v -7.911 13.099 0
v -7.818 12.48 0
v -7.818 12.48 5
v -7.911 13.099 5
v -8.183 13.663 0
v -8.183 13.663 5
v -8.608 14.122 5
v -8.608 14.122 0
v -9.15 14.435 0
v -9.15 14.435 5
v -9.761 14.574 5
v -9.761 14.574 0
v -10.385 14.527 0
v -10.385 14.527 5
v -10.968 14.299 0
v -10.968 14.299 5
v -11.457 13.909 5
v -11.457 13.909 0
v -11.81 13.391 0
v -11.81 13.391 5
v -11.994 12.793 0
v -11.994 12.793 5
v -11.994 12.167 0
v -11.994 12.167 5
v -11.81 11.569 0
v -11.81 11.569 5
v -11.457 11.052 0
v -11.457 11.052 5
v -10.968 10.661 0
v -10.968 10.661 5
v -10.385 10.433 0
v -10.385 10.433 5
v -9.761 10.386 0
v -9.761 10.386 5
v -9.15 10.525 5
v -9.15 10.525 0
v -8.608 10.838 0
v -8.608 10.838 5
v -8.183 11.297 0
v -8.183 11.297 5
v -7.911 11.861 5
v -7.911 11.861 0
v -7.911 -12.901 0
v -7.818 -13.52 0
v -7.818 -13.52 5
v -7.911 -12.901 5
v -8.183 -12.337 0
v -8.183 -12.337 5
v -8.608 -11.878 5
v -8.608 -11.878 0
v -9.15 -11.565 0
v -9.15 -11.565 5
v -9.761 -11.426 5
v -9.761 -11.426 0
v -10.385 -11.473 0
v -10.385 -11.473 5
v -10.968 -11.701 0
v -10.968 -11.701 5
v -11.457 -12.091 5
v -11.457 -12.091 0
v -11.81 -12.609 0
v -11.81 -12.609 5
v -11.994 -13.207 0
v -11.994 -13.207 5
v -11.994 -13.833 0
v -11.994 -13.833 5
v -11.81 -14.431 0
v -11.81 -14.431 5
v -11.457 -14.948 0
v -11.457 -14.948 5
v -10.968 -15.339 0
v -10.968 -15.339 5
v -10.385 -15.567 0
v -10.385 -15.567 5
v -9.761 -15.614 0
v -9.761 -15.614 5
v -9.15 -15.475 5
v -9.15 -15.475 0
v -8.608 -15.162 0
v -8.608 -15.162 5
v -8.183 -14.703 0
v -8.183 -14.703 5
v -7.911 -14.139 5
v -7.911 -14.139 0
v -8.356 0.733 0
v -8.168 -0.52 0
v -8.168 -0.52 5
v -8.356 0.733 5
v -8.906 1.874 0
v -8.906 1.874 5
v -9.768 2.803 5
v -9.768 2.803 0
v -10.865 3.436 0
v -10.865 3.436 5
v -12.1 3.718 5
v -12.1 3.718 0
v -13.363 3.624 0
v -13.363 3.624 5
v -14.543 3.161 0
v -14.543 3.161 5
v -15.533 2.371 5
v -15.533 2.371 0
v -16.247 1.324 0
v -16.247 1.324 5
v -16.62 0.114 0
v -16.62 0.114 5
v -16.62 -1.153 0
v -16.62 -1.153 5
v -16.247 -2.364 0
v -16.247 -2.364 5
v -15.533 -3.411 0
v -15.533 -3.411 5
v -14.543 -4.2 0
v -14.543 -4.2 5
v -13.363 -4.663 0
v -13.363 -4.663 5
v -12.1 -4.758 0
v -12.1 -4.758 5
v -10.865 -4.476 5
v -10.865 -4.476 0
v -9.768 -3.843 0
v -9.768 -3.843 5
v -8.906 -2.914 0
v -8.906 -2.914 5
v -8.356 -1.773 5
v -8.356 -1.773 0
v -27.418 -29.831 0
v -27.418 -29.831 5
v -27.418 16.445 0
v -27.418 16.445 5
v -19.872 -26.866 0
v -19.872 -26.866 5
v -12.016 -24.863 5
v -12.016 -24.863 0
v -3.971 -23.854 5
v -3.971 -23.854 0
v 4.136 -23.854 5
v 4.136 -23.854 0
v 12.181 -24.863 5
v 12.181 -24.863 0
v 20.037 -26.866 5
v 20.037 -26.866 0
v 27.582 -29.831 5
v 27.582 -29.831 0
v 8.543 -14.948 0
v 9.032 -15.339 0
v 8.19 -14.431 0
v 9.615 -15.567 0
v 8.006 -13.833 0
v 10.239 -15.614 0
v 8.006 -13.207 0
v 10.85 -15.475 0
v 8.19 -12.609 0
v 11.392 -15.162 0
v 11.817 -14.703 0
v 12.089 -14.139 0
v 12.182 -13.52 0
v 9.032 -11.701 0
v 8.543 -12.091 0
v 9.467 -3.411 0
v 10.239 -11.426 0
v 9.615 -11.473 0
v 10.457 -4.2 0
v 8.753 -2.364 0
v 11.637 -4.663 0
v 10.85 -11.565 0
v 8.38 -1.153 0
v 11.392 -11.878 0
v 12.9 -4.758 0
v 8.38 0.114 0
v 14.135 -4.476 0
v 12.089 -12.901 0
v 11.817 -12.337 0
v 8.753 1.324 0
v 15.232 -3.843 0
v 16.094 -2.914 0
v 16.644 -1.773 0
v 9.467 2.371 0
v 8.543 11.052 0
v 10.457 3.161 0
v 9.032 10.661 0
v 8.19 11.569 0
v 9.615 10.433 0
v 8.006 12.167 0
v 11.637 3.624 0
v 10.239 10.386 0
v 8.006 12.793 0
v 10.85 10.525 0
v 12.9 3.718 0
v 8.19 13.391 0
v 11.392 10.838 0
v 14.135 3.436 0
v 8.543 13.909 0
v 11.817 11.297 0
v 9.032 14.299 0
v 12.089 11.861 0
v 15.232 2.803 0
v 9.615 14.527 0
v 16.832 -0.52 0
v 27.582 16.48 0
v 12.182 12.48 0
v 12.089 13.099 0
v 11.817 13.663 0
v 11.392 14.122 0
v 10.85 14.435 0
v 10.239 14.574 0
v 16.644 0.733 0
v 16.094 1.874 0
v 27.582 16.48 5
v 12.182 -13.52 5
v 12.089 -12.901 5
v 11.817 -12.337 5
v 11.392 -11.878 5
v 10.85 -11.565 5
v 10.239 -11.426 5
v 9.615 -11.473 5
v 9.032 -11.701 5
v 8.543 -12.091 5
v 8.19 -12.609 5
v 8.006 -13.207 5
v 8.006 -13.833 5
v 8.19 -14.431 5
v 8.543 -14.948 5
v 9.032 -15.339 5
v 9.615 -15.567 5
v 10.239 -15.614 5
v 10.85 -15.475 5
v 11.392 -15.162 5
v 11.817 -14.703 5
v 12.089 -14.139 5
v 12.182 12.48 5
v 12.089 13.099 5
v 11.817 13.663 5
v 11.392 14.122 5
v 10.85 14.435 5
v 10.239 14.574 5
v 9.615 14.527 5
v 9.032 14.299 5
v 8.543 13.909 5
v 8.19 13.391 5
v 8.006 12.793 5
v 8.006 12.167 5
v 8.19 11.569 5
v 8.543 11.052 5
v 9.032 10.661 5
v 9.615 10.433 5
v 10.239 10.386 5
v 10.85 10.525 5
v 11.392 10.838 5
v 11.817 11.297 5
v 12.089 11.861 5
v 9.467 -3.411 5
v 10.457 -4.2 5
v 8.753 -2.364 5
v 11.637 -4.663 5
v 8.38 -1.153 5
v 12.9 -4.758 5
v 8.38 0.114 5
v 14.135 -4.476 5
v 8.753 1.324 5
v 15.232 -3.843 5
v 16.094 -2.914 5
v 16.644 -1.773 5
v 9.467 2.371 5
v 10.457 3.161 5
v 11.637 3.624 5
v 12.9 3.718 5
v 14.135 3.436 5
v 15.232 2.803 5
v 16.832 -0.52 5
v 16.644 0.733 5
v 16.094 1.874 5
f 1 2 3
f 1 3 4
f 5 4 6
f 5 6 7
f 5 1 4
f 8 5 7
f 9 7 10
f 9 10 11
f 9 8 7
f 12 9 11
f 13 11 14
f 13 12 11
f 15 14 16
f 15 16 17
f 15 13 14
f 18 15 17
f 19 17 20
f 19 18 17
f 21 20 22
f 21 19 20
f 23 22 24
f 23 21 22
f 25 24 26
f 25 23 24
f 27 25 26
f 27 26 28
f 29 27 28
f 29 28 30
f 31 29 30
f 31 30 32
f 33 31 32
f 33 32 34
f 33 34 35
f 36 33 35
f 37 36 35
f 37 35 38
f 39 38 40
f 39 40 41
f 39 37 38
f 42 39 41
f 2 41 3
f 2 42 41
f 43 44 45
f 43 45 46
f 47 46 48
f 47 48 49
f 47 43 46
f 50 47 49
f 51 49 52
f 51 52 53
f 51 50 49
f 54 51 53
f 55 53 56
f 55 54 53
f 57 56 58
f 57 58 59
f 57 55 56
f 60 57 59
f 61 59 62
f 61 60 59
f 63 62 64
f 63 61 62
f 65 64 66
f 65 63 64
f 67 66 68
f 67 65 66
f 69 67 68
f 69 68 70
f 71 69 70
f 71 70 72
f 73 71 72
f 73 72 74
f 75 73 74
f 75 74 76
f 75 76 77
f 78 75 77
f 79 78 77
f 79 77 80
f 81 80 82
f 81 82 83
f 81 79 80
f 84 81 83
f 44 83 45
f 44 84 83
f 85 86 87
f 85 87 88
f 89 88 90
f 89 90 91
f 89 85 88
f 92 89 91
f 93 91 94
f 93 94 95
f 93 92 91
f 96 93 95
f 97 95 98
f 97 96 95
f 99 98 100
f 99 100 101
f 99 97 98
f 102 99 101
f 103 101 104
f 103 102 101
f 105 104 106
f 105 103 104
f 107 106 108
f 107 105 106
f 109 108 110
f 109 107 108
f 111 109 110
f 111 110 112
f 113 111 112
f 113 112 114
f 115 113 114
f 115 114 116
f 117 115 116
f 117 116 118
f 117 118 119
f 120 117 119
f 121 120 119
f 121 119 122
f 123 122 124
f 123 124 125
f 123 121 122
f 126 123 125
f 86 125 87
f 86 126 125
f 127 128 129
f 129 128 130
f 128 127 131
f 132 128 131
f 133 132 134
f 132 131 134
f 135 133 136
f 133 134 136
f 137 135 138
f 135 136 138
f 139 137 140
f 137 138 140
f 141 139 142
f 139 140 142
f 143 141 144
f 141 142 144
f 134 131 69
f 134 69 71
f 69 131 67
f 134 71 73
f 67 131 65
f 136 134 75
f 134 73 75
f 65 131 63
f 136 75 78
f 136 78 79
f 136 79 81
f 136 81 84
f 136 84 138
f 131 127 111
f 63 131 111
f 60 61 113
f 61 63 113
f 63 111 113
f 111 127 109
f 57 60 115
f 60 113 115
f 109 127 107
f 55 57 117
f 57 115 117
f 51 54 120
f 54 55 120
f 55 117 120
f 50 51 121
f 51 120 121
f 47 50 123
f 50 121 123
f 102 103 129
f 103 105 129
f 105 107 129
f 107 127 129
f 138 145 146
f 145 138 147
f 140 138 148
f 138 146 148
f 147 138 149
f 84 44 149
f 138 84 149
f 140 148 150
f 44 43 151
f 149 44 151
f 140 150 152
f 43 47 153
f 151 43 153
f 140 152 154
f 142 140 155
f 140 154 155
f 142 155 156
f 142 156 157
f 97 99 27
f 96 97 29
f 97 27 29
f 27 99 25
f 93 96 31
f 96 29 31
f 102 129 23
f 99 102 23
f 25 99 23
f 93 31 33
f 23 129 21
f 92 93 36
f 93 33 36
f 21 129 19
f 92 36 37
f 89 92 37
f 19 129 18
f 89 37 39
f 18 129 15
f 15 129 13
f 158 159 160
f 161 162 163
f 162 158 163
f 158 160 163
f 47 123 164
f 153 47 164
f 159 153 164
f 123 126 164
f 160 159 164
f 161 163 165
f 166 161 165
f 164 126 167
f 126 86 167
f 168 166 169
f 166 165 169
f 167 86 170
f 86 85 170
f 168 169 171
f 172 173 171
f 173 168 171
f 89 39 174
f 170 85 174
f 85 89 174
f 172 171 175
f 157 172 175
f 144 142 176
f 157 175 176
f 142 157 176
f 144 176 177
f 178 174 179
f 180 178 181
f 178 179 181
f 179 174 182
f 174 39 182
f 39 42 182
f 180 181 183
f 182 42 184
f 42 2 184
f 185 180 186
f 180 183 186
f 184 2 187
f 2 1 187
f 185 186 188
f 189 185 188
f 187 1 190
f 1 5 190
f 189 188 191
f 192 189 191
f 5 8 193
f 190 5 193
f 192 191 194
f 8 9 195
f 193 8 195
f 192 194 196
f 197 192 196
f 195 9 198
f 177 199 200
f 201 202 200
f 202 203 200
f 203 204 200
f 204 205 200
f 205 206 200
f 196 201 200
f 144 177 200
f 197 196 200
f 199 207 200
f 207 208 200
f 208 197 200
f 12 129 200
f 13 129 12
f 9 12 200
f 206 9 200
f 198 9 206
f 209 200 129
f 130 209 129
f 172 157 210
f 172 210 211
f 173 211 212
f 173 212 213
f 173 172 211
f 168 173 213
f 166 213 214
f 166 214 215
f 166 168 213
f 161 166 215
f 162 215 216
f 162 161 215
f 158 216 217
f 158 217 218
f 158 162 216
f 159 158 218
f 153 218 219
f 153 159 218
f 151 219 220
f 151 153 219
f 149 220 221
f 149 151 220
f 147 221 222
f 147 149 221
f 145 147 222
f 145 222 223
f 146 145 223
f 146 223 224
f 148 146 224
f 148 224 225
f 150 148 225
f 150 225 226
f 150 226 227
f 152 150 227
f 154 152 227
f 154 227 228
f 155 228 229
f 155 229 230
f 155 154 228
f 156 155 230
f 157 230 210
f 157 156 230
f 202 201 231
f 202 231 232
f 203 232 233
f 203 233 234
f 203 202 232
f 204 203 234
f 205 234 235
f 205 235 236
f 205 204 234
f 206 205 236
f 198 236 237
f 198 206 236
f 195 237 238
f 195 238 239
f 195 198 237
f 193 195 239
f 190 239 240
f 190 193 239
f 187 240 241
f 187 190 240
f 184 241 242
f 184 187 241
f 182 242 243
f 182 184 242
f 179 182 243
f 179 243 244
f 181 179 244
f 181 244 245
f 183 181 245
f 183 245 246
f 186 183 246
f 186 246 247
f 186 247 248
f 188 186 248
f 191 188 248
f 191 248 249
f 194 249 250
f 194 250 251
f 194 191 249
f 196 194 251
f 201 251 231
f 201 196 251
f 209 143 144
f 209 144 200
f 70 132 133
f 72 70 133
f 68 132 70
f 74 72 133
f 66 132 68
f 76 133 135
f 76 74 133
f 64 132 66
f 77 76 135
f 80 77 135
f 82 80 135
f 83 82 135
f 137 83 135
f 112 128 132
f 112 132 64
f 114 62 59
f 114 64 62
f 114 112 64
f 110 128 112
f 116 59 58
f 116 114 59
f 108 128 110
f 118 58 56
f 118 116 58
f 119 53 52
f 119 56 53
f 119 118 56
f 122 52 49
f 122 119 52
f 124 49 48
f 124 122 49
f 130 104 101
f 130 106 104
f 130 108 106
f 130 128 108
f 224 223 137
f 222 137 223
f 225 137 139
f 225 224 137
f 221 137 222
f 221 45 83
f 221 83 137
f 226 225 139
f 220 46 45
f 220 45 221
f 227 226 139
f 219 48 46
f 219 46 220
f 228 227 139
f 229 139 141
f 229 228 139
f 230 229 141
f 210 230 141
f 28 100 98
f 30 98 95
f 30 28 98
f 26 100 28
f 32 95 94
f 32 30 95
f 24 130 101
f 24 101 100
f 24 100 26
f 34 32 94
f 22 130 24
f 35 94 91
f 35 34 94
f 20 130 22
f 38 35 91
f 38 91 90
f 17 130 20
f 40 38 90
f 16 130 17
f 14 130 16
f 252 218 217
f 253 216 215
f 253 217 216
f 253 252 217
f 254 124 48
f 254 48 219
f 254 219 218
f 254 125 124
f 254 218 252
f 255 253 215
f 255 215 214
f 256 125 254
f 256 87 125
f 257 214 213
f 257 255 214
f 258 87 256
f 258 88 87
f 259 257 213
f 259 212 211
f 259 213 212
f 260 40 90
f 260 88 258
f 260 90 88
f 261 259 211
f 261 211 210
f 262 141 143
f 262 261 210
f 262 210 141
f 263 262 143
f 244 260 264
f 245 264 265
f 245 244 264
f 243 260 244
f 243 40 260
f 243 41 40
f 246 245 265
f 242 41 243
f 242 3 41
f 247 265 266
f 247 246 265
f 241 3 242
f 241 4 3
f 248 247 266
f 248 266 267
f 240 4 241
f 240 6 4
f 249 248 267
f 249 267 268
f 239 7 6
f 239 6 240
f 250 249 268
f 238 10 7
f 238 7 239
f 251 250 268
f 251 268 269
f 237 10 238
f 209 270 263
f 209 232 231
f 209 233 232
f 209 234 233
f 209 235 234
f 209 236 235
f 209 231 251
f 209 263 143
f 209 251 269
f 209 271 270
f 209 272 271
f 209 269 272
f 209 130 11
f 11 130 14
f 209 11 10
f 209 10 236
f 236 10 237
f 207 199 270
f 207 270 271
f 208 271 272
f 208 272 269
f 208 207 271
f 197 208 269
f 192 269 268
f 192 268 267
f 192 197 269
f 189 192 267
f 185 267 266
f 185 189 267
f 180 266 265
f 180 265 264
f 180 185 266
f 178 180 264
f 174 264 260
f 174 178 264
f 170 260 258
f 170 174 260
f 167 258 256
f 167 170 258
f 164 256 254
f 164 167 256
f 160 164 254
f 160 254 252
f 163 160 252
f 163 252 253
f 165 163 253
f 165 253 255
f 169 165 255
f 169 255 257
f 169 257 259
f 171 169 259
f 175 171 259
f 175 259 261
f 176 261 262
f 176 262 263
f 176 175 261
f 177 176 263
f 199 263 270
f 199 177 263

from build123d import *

# Parameters (mm, degrees)
SKETCH1_R           = 4.25
SKETCH1_R_2         = 2.1
BOSS_EXTRUDE1_DEPTH = 5
SKETCH2_W           = 23
SKETCH2_H           = 60
CUT_EXTRUDE1_DEPTH  = 10
FILLET1_R           = 5
FILLET2_R           = 5
CUT_EXTRUDE2_DEPTH  = 5


with BuildPart() as part:
    # Sketch1 → Boss-Extrude1 (new body)
    with BuildSketch(Plane.XY):
        with BuildLine():
            Line((-50.417601538, -29.831415105), (-27.417601538, -29.831415105))
            ThreePointArc((-27.417601538, -29.831415105), (0.082398462, -23.727510052), (27.582398462, -29.831415105))
            Line((27.582398462, -29.831415105), (50.582398462, -29.831415105))
            Line((50.582398462, -29.831415105), (50.582398462, 25.168584895))
            ThreePointArc((50.582398462, 25.168584895), (49.117932367, 28.704118801), (45.582398462, 30.168584895))
            Line((45.582398462, 30.168584895), (-45.417601538, 30.168584895))
            ThreePointArc((-45.417601538, 30.168584895), (-48.953135444, 28.704118801), (-50.417601538, 25.168584895))
            Line((-50.417601538, 25.168584895), (-50.417601538, -29.831415105))
        make_face()
        with Locations((12.582398462, -0.519851907)):
            Circle(SKETCH1_R, mode=Mode.SUBTRACT)
        with Locations((10.082398462, -13.519851907)):
            Circle(SKETCH1_R_2, mode=Mode.SUBTRACT)
        with Locations((-9.917601538, -13.519851907)):
            Circle(SKETCH1_R_2, mode=Mode.SUBTRACT)
        with Locations((-12.417601538, -0.519851907)):
            Circle(SKETCH1_R, mode=Mode.SUBTRACT)
        with Locations((-9.917601538, 12.480148093)):
            Circle(SKETCH1_R_2, mode=Mode.SUBTRACT)
        with Locations((10.082398462, 12.480148093)):
            Circle(SKETCH1_R_2, mode=Mode.SUBTRACT)
    extrude(amount=BOSS_EXTRUDE1_DEPTH)

    # Sketch2 → Cut-Extrude1 (cut)
    with BuildSketch(Plane.XY.offset(5)):
        with Locations((-38.917601538, 0.168584895)):
            Rectangle(SKETCH2_W, SKETCH2_H)
        with Locations((39.082398462, 0.168584895)):
            Rectangle(SKETCH2_W, SKETCH2_H)
    extrude(amount=-CUT_EXTRUDE1_DEPTH, mode=Mode.SUBTRACT)

    # Fillet1
    fillet1_edges = [part.edges().sort_by_distance(p)[0] for p in [
        (27.582398462, 30.168584895, 2.5),
    ]]
    fillet(fillet1_edges, radius=FILLET1_R)

    # Fillet2
    fillet2_edges = [part.edges().sort_by_distance(p)[0] for p in [
        (-27.417601538, 30.168584895, 2.5),
    ]]
    fillet(fillet2_edges, radius=FILLET2_R)

    # Sketch3 → Cut-Extrude2 (cut)
    with BuildSketch(Plane(origin=(0, 0, 0), x_dir=(-1, 0, 0), z_dir=(0, 0, -1))):
        with BuildLine():
            Line((-27.582398462, 25.168584895), (-27.582398462, 16.480148093))
            Line((-27.582398462, 16.480148093), (27.417601538, 16.444815638))
            Line((27.417601538, 16.444815638), (27.417601538, 25.168584895))
            ThreePointArc((27.417601538, 25.168584895), (25.953135444, 28.704118801), (22.417601538, 30.168584895))
            Line((22.417601538, 30.168584895), (-22.582398462, 30.168584895))
            ThreePointArc((-22.582398462, 30.168584895), (-26.117932367, 28.704118801), (-27.582398462, 25.168584895))
        make_face()
    extrude(amount=-CUT_EXTRUDE2_DEPTH, mode=Mode.SUBTRACT)


solid = part.part
